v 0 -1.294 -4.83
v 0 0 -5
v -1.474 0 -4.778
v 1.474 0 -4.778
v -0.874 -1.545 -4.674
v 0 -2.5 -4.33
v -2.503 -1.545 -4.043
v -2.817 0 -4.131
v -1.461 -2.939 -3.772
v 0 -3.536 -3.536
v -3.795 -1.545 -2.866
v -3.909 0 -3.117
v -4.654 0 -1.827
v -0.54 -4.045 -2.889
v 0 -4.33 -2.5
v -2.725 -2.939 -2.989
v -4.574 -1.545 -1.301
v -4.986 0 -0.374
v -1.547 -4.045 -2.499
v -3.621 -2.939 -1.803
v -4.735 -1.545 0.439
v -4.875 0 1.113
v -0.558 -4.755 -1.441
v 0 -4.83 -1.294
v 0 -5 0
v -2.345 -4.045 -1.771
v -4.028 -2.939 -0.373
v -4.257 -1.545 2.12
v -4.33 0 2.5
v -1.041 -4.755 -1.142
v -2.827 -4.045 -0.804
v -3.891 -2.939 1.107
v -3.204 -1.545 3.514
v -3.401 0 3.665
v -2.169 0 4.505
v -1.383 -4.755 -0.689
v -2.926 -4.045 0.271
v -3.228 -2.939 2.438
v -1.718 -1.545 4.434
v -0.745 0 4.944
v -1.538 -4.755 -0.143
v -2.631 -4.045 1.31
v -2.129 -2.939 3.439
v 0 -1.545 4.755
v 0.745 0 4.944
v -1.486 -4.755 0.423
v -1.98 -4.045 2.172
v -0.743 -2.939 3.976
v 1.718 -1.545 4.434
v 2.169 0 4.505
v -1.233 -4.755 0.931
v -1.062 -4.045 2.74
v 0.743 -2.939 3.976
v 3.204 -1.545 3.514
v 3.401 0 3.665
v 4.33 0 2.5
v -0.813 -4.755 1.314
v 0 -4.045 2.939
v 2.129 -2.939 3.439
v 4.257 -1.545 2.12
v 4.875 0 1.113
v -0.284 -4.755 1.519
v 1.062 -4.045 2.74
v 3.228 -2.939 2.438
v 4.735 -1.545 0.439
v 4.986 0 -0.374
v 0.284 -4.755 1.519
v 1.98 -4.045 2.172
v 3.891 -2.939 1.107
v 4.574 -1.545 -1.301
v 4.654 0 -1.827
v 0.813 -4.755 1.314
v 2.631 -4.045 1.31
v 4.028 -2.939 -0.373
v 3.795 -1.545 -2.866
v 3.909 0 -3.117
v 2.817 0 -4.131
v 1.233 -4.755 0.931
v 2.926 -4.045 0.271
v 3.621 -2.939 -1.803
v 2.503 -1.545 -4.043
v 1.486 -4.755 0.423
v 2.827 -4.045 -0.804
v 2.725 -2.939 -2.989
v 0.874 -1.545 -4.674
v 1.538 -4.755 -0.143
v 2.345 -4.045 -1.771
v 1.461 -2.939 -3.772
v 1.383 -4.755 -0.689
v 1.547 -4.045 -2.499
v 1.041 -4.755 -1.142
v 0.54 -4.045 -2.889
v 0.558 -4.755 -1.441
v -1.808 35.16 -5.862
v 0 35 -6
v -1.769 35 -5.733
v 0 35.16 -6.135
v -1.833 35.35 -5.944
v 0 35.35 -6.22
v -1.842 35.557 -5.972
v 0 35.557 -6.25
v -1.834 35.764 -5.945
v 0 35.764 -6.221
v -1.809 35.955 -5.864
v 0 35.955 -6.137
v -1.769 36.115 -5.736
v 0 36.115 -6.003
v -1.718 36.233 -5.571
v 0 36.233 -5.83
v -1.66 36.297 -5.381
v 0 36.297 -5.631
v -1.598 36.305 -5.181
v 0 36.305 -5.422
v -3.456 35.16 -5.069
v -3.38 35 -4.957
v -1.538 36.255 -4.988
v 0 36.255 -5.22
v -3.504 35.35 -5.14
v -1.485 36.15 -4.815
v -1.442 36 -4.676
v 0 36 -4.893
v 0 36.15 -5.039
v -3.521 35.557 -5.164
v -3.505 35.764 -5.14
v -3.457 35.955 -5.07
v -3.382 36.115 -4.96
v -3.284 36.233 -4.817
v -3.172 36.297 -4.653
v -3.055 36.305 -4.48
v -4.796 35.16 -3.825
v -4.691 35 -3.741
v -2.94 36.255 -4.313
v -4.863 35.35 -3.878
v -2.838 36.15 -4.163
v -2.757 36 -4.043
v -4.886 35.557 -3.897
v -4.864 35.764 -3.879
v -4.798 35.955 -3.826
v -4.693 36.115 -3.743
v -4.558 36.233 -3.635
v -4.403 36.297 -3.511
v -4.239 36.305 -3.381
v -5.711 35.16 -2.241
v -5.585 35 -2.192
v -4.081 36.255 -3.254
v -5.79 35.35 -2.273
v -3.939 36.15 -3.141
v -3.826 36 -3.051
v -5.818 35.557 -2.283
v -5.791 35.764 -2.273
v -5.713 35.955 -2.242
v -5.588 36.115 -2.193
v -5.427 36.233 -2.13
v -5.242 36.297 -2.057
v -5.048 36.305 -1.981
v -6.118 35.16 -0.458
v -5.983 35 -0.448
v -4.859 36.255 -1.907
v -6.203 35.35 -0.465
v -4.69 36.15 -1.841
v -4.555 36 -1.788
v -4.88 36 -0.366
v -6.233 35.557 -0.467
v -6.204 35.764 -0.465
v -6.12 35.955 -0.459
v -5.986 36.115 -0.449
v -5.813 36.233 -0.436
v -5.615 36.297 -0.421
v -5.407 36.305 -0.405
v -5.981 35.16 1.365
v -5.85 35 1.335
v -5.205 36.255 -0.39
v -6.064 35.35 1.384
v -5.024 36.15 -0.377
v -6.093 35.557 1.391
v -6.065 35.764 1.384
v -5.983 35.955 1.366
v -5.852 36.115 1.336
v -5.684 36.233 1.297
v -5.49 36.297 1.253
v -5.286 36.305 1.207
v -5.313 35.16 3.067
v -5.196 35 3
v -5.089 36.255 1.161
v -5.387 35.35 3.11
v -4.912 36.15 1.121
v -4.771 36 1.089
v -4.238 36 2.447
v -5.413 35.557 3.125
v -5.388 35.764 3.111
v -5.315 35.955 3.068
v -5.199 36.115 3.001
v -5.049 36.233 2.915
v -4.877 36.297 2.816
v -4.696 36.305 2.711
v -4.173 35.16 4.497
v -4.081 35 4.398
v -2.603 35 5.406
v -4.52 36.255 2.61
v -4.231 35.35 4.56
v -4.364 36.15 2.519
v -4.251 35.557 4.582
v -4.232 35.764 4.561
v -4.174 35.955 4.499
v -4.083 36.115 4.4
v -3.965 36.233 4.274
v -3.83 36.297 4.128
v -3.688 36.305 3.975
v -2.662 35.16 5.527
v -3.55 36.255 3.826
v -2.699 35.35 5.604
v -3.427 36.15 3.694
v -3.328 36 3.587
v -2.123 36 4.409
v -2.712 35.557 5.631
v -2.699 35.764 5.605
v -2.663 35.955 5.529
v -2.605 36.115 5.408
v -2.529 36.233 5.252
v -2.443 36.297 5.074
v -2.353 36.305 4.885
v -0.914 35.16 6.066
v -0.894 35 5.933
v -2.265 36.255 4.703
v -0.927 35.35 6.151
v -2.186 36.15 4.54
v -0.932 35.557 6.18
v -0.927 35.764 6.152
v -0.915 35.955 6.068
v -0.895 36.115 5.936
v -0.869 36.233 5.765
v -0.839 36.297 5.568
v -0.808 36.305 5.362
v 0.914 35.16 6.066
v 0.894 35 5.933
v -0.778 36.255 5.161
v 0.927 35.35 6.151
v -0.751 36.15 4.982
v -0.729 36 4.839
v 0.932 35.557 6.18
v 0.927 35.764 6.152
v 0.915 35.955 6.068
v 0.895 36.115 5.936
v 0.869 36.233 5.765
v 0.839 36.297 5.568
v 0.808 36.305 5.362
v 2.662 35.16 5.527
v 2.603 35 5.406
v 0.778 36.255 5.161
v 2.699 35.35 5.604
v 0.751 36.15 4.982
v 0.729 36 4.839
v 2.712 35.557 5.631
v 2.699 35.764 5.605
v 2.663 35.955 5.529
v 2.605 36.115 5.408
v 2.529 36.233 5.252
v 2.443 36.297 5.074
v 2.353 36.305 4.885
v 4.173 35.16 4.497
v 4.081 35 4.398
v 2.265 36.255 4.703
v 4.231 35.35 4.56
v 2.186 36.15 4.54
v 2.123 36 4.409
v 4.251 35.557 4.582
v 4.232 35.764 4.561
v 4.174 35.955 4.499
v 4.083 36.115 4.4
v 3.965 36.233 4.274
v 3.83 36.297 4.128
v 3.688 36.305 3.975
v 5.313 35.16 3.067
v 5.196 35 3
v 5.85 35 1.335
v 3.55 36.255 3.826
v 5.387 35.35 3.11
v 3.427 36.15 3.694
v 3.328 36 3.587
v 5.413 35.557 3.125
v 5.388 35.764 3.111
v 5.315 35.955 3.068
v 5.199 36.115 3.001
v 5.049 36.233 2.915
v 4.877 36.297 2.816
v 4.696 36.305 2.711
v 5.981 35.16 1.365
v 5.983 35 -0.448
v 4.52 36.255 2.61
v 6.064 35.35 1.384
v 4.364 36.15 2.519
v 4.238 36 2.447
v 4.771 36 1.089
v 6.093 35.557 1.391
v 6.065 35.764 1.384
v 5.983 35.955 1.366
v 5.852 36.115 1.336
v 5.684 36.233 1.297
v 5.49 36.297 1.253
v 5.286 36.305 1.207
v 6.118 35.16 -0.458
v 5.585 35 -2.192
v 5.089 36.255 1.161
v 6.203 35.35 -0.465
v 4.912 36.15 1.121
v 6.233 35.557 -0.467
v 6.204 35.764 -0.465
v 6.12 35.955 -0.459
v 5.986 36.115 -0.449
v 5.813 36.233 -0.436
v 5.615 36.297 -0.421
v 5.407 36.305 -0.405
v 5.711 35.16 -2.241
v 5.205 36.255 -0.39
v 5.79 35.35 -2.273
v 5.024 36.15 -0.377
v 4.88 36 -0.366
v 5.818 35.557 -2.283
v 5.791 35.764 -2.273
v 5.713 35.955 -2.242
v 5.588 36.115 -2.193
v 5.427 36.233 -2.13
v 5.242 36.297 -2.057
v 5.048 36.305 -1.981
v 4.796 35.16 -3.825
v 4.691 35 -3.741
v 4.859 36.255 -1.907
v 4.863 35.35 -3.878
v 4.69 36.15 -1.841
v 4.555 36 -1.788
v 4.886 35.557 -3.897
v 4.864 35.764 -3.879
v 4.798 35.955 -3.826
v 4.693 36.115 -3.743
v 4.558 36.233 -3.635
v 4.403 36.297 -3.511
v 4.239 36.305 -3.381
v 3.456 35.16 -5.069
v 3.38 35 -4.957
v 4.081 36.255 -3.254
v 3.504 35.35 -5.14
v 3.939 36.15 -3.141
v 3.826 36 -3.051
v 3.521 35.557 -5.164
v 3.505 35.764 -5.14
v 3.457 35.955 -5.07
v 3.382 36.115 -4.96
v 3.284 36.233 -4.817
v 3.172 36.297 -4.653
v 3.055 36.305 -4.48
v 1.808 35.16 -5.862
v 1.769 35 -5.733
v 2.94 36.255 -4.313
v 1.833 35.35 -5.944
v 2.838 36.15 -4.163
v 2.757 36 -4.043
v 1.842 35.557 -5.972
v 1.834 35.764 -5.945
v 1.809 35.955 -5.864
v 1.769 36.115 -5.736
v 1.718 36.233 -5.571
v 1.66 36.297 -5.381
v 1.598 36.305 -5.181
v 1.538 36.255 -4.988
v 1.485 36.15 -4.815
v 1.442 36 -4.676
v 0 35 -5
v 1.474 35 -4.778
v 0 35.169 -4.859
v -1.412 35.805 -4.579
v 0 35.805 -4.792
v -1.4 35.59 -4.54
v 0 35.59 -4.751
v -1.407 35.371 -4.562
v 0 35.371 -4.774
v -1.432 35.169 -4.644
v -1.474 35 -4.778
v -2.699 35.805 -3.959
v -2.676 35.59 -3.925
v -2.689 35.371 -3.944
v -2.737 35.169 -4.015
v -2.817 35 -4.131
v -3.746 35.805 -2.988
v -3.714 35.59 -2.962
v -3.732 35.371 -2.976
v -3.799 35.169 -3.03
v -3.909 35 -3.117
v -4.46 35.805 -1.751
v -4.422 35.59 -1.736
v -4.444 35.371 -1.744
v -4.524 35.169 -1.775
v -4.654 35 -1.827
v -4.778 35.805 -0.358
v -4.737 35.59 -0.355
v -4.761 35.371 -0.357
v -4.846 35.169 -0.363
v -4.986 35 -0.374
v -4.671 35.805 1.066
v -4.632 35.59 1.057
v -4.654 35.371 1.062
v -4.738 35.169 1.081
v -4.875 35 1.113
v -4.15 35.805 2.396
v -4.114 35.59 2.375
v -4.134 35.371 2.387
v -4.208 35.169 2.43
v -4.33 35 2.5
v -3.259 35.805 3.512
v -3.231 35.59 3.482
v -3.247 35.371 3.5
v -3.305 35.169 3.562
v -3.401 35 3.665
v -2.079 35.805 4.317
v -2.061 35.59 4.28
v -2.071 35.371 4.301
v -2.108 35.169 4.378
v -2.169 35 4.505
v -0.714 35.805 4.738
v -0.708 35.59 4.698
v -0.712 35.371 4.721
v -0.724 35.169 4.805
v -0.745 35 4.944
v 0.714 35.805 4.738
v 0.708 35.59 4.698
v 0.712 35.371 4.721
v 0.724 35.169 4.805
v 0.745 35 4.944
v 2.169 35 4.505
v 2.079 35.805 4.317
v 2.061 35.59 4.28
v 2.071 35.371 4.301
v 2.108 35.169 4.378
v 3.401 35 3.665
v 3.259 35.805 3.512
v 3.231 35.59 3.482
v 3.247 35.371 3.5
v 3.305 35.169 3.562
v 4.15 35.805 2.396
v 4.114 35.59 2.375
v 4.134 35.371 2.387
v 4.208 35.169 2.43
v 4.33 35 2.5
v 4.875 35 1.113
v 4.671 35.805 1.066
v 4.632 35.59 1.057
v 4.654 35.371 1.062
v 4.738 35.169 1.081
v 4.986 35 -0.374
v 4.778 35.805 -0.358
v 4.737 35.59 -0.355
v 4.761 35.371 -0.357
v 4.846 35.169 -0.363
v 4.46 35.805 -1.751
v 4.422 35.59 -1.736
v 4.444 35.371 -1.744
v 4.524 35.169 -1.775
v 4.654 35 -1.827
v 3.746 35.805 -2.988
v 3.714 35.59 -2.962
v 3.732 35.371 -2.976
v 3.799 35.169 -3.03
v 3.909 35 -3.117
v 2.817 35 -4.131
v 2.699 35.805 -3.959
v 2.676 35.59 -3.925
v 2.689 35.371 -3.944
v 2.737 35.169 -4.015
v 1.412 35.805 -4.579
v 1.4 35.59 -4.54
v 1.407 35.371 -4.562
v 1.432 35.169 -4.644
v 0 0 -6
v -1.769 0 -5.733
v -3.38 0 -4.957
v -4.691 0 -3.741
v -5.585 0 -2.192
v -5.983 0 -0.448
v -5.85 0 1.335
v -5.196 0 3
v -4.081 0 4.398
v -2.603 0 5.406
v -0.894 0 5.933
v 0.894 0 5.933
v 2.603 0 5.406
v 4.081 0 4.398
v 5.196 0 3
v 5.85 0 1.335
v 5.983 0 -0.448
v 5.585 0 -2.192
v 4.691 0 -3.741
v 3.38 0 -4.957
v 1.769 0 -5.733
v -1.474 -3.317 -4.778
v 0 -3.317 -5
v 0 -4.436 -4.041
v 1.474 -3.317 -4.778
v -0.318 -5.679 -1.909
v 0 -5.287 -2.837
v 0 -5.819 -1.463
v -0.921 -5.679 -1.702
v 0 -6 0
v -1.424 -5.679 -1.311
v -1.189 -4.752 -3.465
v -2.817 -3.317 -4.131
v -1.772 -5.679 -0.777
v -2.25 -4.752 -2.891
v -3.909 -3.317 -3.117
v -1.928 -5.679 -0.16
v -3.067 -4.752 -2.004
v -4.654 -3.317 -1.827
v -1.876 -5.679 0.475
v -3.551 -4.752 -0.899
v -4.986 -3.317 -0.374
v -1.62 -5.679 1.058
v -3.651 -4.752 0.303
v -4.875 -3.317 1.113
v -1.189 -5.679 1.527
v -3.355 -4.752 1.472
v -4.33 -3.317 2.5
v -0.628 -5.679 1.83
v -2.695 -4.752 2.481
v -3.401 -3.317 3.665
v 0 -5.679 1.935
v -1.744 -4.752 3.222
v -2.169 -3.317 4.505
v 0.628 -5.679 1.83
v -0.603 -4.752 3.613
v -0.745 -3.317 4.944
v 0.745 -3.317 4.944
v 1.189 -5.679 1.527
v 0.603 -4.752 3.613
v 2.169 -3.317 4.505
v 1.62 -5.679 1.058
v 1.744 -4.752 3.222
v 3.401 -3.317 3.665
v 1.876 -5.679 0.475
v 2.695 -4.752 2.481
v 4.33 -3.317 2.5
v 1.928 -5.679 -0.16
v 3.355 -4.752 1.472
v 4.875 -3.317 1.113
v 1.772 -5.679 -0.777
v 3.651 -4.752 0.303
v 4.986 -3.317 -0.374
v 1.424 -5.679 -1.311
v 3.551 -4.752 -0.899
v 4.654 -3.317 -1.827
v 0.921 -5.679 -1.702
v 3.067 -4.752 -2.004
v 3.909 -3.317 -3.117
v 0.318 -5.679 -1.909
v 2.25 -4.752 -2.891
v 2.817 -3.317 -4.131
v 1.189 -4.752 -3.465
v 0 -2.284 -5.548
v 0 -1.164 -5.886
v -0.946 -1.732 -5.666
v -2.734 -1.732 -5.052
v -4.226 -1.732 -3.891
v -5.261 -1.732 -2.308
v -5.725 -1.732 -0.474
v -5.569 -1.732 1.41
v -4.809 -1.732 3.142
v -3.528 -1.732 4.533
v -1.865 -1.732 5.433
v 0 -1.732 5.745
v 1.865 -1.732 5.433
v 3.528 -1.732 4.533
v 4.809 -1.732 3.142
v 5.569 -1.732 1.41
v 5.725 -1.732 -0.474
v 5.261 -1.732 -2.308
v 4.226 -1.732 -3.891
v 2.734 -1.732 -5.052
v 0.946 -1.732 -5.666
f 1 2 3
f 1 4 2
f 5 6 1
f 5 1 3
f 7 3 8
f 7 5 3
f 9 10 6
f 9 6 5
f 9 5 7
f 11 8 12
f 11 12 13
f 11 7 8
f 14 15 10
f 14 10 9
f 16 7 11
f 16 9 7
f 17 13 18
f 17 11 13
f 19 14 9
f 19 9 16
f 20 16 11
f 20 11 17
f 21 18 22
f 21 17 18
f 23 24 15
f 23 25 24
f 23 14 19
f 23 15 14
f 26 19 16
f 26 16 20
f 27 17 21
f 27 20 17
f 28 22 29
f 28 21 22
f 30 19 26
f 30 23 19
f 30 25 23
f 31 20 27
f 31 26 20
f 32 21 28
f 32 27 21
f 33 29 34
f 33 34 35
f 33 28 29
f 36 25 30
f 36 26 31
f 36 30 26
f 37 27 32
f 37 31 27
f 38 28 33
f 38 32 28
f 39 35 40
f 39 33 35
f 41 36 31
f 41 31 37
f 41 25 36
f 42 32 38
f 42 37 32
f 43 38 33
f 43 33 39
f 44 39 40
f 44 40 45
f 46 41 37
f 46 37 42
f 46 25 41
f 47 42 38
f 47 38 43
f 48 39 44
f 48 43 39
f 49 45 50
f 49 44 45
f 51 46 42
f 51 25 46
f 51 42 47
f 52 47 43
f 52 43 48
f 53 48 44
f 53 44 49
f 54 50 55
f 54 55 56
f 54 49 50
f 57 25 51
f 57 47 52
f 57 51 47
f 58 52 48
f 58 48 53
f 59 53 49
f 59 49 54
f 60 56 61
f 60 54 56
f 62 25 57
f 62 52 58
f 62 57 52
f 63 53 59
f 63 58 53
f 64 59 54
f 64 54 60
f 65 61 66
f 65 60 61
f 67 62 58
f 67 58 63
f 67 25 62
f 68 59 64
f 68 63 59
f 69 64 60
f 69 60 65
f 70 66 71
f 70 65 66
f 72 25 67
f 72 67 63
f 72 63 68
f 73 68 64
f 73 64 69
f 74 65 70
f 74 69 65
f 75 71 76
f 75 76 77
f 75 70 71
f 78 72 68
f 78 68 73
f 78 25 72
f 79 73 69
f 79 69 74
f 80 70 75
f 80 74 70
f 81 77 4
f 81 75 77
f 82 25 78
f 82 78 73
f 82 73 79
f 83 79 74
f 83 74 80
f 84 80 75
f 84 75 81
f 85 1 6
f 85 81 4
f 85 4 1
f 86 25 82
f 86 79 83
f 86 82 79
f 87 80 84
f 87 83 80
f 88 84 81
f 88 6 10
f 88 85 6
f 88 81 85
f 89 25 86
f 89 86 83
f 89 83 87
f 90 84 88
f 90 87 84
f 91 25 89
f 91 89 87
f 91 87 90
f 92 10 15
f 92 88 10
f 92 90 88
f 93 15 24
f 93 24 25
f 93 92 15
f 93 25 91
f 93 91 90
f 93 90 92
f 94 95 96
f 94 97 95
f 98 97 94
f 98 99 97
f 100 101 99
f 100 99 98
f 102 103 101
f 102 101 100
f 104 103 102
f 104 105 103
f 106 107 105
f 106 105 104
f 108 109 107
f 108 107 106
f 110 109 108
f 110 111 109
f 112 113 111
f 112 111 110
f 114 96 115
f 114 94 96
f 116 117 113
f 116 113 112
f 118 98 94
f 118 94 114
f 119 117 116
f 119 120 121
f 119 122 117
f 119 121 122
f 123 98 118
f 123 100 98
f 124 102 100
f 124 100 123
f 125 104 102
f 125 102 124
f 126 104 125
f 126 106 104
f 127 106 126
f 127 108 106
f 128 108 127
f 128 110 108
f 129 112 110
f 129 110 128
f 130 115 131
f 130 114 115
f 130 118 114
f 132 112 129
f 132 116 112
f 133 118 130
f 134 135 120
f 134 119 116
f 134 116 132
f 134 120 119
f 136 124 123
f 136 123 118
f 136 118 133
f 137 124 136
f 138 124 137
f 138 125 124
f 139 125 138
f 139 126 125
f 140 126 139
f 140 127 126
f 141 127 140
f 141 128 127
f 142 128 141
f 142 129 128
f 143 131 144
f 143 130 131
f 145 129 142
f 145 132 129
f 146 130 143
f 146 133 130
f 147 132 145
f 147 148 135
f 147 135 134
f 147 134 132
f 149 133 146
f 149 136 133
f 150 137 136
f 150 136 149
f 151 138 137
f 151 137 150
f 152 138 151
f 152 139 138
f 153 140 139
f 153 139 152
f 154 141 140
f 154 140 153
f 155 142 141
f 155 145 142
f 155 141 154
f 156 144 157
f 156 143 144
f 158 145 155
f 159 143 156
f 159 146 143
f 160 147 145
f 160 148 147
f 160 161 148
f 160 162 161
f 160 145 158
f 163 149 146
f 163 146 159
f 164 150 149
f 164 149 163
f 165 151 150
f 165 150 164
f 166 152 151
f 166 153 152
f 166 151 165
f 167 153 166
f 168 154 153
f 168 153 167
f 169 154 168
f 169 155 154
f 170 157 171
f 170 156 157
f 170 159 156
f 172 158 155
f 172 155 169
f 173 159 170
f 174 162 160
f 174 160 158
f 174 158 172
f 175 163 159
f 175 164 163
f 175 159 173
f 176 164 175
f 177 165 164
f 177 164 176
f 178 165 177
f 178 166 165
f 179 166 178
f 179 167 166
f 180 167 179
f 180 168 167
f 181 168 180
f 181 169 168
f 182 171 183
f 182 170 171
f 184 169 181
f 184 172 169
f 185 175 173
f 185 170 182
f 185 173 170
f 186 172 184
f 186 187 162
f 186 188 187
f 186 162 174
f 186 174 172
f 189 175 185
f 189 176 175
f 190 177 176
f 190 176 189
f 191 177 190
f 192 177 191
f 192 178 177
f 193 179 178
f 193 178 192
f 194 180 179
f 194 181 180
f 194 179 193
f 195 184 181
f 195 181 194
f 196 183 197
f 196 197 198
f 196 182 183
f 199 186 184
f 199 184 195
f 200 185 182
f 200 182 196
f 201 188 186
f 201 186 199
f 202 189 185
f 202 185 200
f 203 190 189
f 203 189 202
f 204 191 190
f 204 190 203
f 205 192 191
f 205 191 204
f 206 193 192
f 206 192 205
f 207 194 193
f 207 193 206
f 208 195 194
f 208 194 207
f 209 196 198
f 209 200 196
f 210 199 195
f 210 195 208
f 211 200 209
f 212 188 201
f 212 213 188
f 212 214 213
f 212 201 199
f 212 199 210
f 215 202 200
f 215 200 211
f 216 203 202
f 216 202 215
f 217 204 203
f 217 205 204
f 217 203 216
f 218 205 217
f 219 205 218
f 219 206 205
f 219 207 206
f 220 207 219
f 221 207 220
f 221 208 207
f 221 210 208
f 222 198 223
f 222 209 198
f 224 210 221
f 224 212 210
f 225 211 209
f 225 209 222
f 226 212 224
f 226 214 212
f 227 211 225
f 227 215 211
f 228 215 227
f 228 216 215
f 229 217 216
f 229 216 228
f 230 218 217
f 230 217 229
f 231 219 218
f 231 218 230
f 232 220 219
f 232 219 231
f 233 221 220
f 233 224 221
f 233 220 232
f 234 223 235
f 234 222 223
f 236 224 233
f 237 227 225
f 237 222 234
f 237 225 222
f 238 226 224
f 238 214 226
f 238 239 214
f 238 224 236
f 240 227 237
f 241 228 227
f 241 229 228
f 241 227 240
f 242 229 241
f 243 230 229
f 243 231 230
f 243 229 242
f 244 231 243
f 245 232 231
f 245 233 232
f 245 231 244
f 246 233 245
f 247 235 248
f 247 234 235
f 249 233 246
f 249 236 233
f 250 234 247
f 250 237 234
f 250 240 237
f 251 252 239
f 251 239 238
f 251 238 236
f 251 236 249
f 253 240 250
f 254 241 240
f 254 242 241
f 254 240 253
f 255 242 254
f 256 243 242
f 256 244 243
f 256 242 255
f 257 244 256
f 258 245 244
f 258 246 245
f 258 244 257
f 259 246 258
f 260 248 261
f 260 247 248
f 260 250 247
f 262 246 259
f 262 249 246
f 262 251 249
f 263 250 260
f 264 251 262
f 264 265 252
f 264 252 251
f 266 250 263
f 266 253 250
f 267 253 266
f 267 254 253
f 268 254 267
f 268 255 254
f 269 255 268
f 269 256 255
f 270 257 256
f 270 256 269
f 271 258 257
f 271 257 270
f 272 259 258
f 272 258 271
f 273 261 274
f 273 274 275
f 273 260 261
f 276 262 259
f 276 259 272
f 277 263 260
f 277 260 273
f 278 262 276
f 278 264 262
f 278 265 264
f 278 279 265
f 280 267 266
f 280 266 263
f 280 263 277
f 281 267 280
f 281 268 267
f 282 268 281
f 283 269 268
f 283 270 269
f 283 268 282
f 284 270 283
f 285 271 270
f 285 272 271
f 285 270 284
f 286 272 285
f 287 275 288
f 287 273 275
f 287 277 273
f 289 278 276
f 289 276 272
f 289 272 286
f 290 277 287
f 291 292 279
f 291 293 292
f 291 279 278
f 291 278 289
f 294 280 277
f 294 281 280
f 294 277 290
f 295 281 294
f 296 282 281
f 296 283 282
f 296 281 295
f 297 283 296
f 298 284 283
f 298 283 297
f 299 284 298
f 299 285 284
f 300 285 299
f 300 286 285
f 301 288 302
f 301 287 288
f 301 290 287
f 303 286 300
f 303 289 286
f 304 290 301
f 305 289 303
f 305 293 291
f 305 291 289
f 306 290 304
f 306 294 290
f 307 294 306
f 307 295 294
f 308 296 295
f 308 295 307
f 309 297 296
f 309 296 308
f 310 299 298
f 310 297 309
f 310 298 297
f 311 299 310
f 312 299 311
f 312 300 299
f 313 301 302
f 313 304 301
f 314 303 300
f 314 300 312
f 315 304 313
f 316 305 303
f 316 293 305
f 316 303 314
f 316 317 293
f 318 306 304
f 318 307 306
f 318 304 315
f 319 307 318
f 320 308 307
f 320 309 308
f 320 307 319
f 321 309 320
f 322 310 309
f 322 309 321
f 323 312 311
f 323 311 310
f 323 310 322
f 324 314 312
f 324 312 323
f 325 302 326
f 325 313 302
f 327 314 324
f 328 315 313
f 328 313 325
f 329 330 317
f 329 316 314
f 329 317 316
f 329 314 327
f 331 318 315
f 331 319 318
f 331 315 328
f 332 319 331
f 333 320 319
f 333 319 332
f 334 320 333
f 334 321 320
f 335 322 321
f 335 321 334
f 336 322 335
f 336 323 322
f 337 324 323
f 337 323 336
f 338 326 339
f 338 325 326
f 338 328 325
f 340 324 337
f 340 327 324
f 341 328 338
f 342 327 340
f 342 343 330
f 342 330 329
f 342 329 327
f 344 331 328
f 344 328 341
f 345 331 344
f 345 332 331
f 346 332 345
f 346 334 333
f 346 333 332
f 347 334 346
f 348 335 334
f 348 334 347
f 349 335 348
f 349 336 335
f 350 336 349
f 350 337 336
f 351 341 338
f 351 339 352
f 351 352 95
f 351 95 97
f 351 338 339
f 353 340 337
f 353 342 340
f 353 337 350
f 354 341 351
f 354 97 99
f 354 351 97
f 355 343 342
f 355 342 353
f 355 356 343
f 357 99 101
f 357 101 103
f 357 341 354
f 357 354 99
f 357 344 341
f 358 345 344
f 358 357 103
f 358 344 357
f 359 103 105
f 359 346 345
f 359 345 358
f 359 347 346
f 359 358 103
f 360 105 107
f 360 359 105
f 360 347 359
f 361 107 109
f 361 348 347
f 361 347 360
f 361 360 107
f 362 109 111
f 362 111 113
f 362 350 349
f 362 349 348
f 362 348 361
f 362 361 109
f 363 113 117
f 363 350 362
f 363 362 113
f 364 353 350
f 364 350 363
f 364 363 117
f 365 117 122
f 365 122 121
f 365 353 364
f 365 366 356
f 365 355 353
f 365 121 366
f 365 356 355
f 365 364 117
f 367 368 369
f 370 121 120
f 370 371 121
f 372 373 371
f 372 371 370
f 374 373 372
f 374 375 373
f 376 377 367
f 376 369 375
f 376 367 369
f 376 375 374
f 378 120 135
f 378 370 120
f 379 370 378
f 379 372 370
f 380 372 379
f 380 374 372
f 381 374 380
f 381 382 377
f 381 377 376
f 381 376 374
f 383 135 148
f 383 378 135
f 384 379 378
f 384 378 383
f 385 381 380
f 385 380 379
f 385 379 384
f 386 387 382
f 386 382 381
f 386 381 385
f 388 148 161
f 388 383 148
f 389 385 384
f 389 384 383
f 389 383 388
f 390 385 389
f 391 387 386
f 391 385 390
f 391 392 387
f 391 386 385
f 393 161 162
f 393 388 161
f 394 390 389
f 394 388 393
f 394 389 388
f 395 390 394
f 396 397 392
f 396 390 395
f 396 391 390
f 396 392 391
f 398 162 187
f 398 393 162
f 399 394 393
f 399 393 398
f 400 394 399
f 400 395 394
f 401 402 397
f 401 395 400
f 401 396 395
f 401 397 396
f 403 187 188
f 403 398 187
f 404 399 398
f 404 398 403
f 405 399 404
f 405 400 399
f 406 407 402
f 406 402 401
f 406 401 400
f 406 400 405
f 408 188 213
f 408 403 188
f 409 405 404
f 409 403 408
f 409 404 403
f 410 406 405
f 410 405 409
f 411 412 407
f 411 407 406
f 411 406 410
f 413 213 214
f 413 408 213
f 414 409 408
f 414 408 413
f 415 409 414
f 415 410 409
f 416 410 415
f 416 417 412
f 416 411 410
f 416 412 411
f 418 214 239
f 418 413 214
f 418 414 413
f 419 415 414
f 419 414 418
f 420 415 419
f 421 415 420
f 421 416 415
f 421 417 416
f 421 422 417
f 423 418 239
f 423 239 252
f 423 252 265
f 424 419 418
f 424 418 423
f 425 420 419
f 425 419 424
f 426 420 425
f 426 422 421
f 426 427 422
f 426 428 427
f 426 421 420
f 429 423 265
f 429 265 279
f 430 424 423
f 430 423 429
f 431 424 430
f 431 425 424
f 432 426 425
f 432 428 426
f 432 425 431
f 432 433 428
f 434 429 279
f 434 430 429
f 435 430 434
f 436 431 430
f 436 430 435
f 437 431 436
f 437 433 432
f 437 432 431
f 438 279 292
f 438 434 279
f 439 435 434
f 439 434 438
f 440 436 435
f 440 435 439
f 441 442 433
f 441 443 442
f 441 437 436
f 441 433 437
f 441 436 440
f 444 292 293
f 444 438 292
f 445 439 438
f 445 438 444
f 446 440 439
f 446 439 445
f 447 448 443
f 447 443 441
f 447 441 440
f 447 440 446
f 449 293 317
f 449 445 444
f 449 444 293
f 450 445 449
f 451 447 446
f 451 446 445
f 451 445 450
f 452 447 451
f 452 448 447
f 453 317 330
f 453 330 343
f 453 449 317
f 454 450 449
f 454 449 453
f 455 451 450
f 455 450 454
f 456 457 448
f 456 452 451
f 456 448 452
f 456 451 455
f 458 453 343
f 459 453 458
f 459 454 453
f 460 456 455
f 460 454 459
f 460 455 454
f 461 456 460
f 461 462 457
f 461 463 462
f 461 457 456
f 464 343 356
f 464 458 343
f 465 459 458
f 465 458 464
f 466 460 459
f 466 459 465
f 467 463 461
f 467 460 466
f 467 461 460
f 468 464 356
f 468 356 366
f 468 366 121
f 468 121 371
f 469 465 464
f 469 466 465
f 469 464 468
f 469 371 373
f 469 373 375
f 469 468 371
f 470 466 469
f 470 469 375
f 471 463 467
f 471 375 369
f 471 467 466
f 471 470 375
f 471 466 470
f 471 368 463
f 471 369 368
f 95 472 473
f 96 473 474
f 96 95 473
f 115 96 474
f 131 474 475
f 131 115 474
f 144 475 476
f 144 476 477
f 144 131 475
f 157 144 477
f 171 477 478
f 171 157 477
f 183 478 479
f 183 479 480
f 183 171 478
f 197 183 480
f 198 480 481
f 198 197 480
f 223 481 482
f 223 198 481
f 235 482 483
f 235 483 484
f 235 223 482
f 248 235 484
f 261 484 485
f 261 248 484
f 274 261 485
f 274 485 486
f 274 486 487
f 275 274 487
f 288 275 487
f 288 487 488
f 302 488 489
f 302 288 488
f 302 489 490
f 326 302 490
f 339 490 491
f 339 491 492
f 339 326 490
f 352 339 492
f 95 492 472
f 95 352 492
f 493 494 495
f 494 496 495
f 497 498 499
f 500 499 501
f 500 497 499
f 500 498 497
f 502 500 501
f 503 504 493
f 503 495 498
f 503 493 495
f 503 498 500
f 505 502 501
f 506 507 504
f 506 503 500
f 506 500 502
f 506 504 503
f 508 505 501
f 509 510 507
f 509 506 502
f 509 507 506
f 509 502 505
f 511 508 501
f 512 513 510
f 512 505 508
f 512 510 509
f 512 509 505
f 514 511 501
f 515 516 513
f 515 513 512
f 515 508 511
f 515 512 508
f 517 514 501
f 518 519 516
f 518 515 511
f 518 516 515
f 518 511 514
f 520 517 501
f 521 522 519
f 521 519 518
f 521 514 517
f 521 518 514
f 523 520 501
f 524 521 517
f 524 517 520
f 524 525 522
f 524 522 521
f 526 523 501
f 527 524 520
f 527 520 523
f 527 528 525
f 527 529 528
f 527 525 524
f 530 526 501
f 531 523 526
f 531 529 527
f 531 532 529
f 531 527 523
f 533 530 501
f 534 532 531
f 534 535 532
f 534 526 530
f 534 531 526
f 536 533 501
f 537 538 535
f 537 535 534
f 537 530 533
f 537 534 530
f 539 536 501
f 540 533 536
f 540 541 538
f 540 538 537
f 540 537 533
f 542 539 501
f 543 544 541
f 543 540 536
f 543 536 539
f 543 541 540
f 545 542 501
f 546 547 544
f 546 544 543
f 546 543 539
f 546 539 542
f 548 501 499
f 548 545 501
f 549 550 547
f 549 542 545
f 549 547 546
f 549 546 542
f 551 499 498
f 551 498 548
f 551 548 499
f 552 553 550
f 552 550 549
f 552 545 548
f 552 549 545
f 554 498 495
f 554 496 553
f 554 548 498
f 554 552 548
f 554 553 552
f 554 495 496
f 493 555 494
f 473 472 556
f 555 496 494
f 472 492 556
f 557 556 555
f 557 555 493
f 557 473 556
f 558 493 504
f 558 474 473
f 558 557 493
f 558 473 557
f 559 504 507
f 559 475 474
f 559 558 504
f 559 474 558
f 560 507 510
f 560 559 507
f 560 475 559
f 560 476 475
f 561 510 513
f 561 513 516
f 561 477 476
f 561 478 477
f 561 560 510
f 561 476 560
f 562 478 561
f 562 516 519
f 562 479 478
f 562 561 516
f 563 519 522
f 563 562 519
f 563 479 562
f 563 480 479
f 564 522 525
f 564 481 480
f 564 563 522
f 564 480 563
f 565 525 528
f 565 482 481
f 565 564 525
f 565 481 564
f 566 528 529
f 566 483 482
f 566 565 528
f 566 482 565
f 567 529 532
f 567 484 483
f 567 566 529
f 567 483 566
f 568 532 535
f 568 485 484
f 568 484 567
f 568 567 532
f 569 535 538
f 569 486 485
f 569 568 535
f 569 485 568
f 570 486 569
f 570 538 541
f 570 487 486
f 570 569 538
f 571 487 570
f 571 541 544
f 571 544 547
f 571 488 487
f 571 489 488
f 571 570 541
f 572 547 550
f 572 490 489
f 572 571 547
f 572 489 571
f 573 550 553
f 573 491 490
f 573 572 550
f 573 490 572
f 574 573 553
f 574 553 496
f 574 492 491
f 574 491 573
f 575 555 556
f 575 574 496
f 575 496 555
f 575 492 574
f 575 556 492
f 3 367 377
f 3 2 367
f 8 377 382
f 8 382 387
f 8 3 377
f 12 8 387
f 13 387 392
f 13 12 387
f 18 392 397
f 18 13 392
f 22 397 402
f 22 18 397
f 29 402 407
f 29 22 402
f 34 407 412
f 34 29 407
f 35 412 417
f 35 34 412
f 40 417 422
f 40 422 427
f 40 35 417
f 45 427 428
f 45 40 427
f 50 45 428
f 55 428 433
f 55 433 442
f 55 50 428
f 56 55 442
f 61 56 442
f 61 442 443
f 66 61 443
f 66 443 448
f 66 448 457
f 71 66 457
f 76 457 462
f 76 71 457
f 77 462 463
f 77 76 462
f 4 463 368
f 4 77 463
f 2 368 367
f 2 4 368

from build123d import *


with BuildPart() as part:
    # Sketch1 → Revolve1 (revolve)
    with BuildSketch(Plane.XY, mode=Mode.PRIVATE) as revolve1_sk:
        with BuildLine():
            ThreePointArc((5, -3.31662479), (5.744562647, -1.732050808), (6, 0))
            Line((6, 0), (6, 35))
            ThreePointArc((6, 35), (6.002835942, 36.115484437), (4.893341951, 36))
            ThreePointArc((4.893341951, 36), (4.754229922, 35.479474613), (5, 35))
            Line((5, 35), (5, 0))
            ThreePointArc((5, 0), (3.535533906, -3.535533906), (0, -5))
            Line((0, -5), (0, -6))
            ThreePointArc((0, -6), (2.837274331, -5.286764074), (5, -3.31662479))
        make_face()
    revolve(revolve1_sk.sketch.rotate(Axis((0, 0, 0), (0, 1, 0)), 90), axis=Axis((0, 0, 0), (0, 1, 0)))


solid = part.part
